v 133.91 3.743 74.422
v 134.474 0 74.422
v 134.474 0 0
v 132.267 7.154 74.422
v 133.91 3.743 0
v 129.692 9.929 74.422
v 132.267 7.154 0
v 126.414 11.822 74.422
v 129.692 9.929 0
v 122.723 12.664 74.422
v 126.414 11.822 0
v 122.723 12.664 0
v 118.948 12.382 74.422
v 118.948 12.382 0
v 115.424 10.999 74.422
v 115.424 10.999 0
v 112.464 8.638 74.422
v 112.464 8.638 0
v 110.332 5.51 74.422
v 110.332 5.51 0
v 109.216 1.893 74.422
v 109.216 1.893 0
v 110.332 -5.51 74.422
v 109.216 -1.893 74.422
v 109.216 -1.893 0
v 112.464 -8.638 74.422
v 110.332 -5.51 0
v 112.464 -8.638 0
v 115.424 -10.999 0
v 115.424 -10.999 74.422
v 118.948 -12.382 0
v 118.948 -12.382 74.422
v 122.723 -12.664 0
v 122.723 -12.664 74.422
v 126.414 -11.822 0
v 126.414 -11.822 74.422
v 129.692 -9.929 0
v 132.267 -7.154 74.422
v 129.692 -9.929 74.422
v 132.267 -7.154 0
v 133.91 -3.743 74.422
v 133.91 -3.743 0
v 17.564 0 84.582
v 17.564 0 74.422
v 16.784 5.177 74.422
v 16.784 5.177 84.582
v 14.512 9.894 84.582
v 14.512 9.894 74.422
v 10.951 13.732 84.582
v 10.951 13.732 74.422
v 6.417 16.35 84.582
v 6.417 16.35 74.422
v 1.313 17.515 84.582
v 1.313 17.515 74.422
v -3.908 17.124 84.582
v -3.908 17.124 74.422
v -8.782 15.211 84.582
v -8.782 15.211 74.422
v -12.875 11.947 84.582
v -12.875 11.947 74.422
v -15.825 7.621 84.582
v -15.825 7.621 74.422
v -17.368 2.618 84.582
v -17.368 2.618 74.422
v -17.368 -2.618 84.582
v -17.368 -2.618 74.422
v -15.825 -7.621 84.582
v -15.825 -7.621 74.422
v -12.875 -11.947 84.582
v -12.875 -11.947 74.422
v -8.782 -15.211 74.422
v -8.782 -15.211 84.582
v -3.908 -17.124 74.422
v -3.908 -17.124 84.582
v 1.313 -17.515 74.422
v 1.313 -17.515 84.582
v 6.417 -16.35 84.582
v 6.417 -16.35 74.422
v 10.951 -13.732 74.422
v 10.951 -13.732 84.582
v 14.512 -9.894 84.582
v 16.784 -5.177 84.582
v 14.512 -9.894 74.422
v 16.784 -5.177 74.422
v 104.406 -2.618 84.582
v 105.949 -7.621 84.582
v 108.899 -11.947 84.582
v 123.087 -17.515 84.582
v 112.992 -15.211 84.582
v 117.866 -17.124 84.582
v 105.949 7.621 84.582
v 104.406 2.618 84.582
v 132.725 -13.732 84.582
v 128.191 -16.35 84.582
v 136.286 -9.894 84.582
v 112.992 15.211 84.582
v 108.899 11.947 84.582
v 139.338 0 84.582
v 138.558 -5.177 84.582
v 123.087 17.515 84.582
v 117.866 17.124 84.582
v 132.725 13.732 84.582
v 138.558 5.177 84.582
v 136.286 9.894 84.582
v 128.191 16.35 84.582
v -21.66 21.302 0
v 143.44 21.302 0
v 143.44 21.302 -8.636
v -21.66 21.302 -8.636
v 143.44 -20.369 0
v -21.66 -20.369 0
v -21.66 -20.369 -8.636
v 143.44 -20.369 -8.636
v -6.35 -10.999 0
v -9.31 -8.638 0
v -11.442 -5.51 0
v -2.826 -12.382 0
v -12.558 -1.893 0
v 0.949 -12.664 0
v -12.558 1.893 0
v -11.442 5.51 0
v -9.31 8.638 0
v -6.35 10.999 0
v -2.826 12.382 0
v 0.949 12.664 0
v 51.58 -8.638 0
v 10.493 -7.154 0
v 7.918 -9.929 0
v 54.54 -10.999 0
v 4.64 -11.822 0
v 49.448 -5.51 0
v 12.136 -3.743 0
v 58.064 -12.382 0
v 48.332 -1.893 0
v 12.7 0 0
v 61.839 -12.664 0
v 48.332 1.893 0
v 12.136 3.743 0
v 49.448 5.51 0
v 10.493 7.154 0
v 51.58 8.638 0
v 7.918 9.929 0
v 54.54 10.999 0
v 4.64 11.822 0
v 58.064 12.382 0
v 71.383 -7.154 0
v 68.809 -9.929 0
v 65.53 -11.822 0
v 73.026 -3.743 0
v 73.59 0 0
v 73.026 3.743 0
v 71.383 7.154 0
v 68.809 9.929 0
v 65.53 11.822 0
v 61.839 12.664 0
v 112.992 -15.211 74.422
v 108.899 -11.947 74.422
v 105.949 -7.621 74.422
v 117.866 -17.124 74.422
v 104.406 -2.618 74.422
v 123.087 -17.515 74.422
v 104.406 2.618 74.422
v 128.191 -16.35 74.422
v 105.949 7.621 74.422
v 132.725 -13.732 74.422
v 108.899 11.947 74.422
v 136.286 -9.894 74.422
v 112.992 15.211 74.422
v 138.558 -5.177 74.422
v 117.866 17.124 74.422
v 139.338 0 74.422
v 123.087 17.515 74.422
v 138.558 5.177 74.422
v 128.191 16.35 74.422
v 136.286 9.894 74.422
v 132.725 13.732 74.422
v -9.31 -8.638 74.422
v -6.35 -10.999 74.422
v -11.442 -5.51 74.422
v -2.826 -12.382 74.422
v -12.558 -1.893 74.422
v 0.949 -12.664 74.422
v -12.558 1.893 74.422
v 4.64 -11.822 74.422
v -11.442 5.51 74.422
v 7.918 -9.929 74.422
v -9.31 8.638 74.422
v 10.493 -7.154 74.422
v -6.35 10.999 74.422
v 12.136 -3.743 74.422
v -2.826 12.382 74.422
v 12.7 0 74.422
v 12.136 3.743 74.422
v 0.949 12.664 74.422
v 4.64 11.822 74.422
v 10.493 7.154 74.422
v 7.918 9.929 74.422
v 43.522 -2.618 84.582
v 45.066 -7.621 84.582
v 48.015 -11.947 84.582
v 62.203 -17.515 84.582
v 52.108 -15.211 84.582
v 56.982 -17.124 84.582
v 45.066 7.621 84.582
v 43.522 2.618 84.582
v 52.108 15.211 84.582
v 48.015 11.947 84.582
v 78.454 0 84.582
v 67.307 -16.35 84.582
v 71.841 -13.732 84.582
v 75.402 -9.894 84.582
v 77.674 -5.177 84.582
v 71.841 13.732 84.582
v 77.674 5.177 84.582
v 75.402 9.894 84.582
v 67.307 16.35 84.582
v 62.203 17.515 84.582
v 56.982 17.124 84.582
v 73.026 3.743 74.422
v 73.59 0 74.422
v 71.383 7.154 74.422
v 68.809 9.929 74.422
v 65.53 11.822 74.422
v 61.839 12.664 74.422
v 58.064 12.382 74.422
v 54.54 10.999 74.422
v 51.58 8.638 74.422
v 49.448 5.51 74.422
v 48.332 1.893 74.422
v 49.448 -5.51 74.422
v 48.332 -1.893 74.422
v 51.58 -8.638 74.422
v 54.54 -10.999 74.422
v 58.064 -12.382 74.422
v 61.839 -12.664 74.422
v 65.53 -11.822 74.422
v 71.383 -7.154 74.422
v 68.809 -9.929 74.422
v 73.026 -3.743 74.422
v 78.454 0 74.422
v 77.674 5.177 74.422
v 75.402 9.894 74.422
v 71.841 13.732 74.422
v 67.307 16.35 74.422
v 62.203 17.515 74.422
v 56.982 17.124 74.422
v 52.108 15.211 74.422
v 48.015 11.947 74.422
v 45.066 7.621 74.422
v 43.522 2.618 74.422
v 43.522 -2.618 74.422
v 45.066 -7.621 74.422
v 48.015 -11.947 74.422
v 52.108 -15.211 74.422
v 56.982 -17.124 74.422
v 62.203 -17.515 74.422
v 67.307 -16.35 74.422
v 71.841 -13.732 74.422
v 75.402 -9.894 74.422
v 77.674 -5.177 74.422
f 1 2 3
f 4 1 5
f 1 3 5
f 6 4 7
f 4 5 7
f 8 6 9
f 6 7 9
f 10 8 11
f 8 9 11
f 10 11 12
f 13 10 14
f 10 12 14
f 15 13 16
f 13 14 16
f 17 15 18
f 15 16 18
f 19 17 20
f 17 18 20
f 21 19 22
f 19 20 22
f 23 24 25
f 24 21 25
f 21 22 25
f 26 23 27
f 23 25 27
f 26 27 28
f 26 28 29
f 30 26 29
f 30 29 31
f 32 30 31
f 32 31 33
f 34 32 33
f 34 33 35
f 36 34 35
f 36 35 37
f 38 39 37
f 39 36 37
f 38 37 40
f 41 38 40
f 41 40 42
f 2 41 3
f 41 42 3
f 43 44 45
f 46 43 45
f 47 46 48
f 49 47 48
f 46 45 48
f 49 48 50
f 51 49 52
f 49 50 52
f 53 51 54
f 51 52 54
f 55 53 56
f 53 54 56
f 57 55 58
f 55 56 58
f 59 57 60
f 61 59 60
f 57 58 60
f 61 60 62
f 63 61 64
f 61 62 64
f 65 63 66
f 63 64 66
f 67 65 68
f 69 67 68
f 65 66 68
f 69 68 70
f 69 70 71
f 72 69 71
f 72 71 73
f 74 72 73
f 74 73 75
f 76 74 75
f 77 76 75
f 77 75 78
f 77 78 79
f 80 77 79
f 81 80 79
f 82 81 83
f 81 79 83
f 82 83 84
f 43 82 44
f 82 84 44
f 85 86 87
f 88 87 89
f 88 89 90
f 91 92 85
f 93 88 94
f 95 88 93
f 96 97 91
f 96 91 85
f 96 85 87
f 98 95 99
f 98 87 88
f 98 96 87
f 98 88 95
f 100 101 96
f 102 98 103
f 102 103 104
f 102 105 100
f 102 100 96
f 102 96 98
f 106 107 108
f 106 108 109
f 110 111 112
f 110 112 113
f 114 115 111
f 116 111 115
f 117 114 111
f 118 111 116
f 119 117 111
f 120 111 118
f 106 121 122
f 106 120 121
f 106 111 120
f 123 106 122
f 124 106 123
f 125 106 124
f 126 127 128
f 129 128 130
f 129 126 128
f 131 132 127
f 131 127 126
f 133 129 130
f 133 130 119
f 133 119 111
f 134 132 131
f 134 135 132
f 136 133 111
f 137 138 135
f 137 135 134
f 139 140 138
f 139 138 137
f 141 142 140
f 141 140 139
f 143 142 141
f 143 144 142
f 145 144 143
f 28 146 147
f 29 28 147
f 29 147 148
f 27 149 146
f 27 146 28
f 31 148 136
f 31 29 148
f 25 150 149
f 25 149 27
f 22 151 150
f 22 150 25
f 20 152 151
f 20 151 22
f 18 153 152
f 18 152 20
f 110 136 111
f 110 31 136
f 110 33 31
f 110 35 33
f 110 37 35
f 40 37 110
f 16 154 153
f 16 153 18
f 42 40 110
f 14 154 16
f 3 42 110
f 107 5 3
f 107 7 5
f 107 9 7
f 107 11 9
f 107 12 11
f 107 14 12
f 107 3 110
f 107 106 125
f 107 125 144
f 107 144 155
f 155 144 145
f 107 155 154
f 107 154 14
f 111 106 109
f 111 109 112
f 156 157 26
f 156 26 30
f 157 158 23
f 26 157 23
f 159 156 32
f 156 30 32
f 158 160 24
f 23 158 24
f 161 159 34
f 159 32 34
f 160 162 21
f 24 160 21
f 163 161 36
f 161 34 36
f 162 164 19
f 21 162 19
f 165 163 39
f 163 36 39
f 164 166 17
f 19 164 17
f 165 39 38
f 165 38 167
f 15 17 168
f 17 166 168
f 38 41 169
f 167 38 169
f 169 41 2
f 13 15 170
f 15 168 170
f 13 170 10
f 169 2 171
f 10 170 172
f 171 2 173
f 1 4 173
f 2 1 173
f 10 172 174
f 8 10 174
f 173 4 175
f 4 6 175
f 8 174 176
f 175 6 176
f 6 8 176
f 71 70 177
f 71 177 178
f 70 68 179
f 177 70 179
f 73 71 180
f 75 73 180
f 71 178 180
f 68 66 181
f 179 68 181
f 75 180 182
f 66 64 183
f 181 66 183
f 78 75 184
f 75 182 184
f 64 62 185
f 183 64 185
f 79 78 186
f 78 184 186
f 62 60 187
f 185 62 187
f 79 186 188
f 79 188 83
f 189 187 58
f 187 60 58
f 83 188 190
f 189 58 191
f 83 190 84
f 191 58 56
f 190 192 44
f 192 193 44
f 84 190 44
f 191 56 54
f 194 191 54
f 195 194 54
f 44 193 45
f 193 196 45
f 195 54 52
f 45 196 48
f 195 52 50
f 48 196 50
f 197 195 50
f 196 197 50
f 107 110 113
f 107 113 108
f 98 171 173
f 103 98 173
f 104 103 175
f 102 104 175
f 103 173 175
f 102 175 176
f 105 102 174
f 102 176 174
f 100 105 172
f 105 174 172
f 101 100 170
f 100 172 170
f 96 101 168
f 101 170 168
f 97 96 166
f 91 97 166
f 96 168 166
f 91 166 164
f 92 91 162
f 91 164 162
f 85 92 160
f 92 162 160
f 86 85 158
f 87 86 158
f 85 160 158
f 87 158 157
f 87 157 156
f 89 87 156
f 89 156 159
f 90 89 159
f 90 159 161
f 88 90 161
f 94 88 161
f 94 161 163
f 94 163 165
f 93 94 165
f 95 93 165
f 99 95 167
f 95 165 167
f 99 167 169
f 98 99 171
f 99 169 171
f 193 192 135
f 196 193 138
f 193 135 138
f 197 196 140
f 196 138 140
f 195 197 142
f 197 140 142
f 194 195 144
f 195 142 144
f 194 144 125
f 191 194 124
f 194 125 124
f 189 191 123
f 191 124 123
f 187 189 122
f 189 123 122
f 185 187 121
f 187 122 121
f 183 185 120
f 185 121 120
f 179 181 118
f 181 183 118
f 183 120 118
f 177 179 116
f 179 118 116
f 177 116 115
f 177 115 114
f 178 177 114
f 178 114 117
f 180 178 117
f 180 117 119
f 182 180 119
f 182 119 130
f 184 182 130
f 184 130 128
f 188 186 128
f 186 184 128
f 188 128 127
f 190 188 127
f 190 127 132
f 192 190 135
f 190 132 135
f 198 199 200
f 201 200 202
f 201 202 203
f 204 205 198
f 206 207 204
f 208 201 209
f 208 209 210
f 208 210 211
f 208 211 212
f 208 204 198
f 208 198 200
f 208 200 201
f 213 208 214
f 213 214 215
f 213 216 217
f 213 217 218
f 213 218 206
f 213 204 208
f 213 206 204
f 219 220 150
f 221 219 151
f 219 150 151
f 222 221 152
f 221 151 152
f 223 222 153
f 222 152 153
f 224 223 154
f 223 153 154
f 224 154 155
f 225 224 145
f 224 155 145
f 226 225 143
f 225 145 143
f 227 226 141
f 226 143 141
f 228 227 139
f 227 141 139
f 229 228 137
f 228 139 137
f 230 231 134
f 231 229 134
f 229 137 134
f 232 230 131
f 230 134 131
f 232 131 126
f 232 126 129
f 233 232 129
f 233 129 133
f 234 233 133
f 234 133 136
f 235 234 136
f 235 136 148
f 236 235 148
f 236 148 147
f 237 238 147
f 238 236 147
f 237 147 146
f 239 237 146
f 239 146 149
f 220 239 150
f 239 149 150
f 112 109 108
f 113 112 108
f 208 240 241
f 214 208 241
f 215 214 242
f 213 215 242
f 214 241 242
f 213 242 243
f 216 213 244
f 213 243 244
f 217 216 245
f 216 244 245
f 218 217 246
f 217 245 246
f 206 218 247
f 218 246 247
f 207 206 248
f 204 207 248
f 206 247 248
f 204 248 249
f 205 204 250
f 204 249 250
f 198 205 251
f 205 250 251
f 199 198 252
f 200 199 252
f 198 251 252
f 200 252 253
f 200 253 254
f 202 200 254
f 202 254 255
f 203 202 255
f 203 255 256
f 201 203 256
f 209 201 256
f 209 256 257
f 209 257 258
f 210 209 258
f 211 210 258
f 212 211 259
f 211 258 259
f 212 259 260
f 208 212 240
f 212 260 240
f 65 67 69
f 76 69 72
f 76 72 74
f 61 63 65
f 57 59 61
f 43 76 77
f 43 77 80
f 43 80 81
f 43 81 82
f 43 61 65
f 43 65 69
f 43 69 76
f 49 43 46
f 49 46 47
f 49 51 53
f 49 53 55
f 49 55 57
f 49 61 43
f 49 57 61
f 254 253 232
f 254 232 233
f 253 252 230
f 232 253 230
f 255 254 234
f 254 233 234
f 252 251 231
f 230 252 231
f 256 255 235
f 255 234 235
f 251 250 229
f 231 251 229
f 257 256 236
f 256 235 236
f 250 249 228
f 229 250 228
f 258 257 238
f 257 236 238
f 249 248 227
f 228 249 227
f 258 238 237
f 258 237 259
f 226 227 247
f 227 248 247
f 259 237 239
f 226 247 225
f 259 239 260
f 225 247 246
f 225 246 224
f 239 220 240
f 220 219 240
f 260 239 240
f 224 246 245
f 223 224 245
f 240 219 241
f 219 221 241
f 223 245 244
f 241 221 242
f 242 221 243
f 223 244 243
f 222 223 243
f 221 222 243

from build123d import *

# Parameters (mm, degrees)
F0_R      = 12.7
F1_DEPTH  = 76.2
F3_R      = 17.5641
F4_DEPTH  = 10.16
F6_DEPTH  = 8.636
F7_R      = 12.7
F8_DEPTH  = 76.2
F9_R      = 17.5641
F10_DEPTH = 10.16


with BuildPart() as f1:
    # F0 (on Top) → F1 (new body)
    with BuildSketch(Plane.XY):
        Circle(F0_R)
    extrude(amount=F1_DEPTH)

    # F3 (on offset) → F4 (join)
    with BuildSketch(Plane.XY.offset(74.422)):
        Circle(F3_R)
    extrude(amount=F4_DEPTH)

    # F5 (on Top) → F6 (join)
    with BuildSketch(Plane.XY):
        Polygon((-21.659788, 21.301638), (-21.659788, -20.368967), (60.890212, -20.368967), (60.890212, 0), (60.890212, 21.301638), align=None)
        Polygon((60.890212, 0), (60.890212, -20.368967), (143.440212, -20.368967), (143.440212, 21.301638), (60.890212, 21.301638), align=None)
    extrude(amount=-F6_DEPTH)

    # F7 (on face) → F8 (join)
    with BuildSketch(Plane.XY):
        with Locations((60.890212, 0)):
            Circle(F7_R)
        with Locations((121.774012, 0)):
            Circle(F7_R)
    extrude(amount=F8_DEPTH)

    # F9 (on offset) → F10 (join)
    with BuildSketch(Plane.XY.offset(74.422)):
        with Locations((60.890212, 0)):
            Circle(F9_R)
        with Locations((121.774012, 0)):
            Circle(F9_R)
    extrude(amount=F10_DEPTH)


solid = f1.part
